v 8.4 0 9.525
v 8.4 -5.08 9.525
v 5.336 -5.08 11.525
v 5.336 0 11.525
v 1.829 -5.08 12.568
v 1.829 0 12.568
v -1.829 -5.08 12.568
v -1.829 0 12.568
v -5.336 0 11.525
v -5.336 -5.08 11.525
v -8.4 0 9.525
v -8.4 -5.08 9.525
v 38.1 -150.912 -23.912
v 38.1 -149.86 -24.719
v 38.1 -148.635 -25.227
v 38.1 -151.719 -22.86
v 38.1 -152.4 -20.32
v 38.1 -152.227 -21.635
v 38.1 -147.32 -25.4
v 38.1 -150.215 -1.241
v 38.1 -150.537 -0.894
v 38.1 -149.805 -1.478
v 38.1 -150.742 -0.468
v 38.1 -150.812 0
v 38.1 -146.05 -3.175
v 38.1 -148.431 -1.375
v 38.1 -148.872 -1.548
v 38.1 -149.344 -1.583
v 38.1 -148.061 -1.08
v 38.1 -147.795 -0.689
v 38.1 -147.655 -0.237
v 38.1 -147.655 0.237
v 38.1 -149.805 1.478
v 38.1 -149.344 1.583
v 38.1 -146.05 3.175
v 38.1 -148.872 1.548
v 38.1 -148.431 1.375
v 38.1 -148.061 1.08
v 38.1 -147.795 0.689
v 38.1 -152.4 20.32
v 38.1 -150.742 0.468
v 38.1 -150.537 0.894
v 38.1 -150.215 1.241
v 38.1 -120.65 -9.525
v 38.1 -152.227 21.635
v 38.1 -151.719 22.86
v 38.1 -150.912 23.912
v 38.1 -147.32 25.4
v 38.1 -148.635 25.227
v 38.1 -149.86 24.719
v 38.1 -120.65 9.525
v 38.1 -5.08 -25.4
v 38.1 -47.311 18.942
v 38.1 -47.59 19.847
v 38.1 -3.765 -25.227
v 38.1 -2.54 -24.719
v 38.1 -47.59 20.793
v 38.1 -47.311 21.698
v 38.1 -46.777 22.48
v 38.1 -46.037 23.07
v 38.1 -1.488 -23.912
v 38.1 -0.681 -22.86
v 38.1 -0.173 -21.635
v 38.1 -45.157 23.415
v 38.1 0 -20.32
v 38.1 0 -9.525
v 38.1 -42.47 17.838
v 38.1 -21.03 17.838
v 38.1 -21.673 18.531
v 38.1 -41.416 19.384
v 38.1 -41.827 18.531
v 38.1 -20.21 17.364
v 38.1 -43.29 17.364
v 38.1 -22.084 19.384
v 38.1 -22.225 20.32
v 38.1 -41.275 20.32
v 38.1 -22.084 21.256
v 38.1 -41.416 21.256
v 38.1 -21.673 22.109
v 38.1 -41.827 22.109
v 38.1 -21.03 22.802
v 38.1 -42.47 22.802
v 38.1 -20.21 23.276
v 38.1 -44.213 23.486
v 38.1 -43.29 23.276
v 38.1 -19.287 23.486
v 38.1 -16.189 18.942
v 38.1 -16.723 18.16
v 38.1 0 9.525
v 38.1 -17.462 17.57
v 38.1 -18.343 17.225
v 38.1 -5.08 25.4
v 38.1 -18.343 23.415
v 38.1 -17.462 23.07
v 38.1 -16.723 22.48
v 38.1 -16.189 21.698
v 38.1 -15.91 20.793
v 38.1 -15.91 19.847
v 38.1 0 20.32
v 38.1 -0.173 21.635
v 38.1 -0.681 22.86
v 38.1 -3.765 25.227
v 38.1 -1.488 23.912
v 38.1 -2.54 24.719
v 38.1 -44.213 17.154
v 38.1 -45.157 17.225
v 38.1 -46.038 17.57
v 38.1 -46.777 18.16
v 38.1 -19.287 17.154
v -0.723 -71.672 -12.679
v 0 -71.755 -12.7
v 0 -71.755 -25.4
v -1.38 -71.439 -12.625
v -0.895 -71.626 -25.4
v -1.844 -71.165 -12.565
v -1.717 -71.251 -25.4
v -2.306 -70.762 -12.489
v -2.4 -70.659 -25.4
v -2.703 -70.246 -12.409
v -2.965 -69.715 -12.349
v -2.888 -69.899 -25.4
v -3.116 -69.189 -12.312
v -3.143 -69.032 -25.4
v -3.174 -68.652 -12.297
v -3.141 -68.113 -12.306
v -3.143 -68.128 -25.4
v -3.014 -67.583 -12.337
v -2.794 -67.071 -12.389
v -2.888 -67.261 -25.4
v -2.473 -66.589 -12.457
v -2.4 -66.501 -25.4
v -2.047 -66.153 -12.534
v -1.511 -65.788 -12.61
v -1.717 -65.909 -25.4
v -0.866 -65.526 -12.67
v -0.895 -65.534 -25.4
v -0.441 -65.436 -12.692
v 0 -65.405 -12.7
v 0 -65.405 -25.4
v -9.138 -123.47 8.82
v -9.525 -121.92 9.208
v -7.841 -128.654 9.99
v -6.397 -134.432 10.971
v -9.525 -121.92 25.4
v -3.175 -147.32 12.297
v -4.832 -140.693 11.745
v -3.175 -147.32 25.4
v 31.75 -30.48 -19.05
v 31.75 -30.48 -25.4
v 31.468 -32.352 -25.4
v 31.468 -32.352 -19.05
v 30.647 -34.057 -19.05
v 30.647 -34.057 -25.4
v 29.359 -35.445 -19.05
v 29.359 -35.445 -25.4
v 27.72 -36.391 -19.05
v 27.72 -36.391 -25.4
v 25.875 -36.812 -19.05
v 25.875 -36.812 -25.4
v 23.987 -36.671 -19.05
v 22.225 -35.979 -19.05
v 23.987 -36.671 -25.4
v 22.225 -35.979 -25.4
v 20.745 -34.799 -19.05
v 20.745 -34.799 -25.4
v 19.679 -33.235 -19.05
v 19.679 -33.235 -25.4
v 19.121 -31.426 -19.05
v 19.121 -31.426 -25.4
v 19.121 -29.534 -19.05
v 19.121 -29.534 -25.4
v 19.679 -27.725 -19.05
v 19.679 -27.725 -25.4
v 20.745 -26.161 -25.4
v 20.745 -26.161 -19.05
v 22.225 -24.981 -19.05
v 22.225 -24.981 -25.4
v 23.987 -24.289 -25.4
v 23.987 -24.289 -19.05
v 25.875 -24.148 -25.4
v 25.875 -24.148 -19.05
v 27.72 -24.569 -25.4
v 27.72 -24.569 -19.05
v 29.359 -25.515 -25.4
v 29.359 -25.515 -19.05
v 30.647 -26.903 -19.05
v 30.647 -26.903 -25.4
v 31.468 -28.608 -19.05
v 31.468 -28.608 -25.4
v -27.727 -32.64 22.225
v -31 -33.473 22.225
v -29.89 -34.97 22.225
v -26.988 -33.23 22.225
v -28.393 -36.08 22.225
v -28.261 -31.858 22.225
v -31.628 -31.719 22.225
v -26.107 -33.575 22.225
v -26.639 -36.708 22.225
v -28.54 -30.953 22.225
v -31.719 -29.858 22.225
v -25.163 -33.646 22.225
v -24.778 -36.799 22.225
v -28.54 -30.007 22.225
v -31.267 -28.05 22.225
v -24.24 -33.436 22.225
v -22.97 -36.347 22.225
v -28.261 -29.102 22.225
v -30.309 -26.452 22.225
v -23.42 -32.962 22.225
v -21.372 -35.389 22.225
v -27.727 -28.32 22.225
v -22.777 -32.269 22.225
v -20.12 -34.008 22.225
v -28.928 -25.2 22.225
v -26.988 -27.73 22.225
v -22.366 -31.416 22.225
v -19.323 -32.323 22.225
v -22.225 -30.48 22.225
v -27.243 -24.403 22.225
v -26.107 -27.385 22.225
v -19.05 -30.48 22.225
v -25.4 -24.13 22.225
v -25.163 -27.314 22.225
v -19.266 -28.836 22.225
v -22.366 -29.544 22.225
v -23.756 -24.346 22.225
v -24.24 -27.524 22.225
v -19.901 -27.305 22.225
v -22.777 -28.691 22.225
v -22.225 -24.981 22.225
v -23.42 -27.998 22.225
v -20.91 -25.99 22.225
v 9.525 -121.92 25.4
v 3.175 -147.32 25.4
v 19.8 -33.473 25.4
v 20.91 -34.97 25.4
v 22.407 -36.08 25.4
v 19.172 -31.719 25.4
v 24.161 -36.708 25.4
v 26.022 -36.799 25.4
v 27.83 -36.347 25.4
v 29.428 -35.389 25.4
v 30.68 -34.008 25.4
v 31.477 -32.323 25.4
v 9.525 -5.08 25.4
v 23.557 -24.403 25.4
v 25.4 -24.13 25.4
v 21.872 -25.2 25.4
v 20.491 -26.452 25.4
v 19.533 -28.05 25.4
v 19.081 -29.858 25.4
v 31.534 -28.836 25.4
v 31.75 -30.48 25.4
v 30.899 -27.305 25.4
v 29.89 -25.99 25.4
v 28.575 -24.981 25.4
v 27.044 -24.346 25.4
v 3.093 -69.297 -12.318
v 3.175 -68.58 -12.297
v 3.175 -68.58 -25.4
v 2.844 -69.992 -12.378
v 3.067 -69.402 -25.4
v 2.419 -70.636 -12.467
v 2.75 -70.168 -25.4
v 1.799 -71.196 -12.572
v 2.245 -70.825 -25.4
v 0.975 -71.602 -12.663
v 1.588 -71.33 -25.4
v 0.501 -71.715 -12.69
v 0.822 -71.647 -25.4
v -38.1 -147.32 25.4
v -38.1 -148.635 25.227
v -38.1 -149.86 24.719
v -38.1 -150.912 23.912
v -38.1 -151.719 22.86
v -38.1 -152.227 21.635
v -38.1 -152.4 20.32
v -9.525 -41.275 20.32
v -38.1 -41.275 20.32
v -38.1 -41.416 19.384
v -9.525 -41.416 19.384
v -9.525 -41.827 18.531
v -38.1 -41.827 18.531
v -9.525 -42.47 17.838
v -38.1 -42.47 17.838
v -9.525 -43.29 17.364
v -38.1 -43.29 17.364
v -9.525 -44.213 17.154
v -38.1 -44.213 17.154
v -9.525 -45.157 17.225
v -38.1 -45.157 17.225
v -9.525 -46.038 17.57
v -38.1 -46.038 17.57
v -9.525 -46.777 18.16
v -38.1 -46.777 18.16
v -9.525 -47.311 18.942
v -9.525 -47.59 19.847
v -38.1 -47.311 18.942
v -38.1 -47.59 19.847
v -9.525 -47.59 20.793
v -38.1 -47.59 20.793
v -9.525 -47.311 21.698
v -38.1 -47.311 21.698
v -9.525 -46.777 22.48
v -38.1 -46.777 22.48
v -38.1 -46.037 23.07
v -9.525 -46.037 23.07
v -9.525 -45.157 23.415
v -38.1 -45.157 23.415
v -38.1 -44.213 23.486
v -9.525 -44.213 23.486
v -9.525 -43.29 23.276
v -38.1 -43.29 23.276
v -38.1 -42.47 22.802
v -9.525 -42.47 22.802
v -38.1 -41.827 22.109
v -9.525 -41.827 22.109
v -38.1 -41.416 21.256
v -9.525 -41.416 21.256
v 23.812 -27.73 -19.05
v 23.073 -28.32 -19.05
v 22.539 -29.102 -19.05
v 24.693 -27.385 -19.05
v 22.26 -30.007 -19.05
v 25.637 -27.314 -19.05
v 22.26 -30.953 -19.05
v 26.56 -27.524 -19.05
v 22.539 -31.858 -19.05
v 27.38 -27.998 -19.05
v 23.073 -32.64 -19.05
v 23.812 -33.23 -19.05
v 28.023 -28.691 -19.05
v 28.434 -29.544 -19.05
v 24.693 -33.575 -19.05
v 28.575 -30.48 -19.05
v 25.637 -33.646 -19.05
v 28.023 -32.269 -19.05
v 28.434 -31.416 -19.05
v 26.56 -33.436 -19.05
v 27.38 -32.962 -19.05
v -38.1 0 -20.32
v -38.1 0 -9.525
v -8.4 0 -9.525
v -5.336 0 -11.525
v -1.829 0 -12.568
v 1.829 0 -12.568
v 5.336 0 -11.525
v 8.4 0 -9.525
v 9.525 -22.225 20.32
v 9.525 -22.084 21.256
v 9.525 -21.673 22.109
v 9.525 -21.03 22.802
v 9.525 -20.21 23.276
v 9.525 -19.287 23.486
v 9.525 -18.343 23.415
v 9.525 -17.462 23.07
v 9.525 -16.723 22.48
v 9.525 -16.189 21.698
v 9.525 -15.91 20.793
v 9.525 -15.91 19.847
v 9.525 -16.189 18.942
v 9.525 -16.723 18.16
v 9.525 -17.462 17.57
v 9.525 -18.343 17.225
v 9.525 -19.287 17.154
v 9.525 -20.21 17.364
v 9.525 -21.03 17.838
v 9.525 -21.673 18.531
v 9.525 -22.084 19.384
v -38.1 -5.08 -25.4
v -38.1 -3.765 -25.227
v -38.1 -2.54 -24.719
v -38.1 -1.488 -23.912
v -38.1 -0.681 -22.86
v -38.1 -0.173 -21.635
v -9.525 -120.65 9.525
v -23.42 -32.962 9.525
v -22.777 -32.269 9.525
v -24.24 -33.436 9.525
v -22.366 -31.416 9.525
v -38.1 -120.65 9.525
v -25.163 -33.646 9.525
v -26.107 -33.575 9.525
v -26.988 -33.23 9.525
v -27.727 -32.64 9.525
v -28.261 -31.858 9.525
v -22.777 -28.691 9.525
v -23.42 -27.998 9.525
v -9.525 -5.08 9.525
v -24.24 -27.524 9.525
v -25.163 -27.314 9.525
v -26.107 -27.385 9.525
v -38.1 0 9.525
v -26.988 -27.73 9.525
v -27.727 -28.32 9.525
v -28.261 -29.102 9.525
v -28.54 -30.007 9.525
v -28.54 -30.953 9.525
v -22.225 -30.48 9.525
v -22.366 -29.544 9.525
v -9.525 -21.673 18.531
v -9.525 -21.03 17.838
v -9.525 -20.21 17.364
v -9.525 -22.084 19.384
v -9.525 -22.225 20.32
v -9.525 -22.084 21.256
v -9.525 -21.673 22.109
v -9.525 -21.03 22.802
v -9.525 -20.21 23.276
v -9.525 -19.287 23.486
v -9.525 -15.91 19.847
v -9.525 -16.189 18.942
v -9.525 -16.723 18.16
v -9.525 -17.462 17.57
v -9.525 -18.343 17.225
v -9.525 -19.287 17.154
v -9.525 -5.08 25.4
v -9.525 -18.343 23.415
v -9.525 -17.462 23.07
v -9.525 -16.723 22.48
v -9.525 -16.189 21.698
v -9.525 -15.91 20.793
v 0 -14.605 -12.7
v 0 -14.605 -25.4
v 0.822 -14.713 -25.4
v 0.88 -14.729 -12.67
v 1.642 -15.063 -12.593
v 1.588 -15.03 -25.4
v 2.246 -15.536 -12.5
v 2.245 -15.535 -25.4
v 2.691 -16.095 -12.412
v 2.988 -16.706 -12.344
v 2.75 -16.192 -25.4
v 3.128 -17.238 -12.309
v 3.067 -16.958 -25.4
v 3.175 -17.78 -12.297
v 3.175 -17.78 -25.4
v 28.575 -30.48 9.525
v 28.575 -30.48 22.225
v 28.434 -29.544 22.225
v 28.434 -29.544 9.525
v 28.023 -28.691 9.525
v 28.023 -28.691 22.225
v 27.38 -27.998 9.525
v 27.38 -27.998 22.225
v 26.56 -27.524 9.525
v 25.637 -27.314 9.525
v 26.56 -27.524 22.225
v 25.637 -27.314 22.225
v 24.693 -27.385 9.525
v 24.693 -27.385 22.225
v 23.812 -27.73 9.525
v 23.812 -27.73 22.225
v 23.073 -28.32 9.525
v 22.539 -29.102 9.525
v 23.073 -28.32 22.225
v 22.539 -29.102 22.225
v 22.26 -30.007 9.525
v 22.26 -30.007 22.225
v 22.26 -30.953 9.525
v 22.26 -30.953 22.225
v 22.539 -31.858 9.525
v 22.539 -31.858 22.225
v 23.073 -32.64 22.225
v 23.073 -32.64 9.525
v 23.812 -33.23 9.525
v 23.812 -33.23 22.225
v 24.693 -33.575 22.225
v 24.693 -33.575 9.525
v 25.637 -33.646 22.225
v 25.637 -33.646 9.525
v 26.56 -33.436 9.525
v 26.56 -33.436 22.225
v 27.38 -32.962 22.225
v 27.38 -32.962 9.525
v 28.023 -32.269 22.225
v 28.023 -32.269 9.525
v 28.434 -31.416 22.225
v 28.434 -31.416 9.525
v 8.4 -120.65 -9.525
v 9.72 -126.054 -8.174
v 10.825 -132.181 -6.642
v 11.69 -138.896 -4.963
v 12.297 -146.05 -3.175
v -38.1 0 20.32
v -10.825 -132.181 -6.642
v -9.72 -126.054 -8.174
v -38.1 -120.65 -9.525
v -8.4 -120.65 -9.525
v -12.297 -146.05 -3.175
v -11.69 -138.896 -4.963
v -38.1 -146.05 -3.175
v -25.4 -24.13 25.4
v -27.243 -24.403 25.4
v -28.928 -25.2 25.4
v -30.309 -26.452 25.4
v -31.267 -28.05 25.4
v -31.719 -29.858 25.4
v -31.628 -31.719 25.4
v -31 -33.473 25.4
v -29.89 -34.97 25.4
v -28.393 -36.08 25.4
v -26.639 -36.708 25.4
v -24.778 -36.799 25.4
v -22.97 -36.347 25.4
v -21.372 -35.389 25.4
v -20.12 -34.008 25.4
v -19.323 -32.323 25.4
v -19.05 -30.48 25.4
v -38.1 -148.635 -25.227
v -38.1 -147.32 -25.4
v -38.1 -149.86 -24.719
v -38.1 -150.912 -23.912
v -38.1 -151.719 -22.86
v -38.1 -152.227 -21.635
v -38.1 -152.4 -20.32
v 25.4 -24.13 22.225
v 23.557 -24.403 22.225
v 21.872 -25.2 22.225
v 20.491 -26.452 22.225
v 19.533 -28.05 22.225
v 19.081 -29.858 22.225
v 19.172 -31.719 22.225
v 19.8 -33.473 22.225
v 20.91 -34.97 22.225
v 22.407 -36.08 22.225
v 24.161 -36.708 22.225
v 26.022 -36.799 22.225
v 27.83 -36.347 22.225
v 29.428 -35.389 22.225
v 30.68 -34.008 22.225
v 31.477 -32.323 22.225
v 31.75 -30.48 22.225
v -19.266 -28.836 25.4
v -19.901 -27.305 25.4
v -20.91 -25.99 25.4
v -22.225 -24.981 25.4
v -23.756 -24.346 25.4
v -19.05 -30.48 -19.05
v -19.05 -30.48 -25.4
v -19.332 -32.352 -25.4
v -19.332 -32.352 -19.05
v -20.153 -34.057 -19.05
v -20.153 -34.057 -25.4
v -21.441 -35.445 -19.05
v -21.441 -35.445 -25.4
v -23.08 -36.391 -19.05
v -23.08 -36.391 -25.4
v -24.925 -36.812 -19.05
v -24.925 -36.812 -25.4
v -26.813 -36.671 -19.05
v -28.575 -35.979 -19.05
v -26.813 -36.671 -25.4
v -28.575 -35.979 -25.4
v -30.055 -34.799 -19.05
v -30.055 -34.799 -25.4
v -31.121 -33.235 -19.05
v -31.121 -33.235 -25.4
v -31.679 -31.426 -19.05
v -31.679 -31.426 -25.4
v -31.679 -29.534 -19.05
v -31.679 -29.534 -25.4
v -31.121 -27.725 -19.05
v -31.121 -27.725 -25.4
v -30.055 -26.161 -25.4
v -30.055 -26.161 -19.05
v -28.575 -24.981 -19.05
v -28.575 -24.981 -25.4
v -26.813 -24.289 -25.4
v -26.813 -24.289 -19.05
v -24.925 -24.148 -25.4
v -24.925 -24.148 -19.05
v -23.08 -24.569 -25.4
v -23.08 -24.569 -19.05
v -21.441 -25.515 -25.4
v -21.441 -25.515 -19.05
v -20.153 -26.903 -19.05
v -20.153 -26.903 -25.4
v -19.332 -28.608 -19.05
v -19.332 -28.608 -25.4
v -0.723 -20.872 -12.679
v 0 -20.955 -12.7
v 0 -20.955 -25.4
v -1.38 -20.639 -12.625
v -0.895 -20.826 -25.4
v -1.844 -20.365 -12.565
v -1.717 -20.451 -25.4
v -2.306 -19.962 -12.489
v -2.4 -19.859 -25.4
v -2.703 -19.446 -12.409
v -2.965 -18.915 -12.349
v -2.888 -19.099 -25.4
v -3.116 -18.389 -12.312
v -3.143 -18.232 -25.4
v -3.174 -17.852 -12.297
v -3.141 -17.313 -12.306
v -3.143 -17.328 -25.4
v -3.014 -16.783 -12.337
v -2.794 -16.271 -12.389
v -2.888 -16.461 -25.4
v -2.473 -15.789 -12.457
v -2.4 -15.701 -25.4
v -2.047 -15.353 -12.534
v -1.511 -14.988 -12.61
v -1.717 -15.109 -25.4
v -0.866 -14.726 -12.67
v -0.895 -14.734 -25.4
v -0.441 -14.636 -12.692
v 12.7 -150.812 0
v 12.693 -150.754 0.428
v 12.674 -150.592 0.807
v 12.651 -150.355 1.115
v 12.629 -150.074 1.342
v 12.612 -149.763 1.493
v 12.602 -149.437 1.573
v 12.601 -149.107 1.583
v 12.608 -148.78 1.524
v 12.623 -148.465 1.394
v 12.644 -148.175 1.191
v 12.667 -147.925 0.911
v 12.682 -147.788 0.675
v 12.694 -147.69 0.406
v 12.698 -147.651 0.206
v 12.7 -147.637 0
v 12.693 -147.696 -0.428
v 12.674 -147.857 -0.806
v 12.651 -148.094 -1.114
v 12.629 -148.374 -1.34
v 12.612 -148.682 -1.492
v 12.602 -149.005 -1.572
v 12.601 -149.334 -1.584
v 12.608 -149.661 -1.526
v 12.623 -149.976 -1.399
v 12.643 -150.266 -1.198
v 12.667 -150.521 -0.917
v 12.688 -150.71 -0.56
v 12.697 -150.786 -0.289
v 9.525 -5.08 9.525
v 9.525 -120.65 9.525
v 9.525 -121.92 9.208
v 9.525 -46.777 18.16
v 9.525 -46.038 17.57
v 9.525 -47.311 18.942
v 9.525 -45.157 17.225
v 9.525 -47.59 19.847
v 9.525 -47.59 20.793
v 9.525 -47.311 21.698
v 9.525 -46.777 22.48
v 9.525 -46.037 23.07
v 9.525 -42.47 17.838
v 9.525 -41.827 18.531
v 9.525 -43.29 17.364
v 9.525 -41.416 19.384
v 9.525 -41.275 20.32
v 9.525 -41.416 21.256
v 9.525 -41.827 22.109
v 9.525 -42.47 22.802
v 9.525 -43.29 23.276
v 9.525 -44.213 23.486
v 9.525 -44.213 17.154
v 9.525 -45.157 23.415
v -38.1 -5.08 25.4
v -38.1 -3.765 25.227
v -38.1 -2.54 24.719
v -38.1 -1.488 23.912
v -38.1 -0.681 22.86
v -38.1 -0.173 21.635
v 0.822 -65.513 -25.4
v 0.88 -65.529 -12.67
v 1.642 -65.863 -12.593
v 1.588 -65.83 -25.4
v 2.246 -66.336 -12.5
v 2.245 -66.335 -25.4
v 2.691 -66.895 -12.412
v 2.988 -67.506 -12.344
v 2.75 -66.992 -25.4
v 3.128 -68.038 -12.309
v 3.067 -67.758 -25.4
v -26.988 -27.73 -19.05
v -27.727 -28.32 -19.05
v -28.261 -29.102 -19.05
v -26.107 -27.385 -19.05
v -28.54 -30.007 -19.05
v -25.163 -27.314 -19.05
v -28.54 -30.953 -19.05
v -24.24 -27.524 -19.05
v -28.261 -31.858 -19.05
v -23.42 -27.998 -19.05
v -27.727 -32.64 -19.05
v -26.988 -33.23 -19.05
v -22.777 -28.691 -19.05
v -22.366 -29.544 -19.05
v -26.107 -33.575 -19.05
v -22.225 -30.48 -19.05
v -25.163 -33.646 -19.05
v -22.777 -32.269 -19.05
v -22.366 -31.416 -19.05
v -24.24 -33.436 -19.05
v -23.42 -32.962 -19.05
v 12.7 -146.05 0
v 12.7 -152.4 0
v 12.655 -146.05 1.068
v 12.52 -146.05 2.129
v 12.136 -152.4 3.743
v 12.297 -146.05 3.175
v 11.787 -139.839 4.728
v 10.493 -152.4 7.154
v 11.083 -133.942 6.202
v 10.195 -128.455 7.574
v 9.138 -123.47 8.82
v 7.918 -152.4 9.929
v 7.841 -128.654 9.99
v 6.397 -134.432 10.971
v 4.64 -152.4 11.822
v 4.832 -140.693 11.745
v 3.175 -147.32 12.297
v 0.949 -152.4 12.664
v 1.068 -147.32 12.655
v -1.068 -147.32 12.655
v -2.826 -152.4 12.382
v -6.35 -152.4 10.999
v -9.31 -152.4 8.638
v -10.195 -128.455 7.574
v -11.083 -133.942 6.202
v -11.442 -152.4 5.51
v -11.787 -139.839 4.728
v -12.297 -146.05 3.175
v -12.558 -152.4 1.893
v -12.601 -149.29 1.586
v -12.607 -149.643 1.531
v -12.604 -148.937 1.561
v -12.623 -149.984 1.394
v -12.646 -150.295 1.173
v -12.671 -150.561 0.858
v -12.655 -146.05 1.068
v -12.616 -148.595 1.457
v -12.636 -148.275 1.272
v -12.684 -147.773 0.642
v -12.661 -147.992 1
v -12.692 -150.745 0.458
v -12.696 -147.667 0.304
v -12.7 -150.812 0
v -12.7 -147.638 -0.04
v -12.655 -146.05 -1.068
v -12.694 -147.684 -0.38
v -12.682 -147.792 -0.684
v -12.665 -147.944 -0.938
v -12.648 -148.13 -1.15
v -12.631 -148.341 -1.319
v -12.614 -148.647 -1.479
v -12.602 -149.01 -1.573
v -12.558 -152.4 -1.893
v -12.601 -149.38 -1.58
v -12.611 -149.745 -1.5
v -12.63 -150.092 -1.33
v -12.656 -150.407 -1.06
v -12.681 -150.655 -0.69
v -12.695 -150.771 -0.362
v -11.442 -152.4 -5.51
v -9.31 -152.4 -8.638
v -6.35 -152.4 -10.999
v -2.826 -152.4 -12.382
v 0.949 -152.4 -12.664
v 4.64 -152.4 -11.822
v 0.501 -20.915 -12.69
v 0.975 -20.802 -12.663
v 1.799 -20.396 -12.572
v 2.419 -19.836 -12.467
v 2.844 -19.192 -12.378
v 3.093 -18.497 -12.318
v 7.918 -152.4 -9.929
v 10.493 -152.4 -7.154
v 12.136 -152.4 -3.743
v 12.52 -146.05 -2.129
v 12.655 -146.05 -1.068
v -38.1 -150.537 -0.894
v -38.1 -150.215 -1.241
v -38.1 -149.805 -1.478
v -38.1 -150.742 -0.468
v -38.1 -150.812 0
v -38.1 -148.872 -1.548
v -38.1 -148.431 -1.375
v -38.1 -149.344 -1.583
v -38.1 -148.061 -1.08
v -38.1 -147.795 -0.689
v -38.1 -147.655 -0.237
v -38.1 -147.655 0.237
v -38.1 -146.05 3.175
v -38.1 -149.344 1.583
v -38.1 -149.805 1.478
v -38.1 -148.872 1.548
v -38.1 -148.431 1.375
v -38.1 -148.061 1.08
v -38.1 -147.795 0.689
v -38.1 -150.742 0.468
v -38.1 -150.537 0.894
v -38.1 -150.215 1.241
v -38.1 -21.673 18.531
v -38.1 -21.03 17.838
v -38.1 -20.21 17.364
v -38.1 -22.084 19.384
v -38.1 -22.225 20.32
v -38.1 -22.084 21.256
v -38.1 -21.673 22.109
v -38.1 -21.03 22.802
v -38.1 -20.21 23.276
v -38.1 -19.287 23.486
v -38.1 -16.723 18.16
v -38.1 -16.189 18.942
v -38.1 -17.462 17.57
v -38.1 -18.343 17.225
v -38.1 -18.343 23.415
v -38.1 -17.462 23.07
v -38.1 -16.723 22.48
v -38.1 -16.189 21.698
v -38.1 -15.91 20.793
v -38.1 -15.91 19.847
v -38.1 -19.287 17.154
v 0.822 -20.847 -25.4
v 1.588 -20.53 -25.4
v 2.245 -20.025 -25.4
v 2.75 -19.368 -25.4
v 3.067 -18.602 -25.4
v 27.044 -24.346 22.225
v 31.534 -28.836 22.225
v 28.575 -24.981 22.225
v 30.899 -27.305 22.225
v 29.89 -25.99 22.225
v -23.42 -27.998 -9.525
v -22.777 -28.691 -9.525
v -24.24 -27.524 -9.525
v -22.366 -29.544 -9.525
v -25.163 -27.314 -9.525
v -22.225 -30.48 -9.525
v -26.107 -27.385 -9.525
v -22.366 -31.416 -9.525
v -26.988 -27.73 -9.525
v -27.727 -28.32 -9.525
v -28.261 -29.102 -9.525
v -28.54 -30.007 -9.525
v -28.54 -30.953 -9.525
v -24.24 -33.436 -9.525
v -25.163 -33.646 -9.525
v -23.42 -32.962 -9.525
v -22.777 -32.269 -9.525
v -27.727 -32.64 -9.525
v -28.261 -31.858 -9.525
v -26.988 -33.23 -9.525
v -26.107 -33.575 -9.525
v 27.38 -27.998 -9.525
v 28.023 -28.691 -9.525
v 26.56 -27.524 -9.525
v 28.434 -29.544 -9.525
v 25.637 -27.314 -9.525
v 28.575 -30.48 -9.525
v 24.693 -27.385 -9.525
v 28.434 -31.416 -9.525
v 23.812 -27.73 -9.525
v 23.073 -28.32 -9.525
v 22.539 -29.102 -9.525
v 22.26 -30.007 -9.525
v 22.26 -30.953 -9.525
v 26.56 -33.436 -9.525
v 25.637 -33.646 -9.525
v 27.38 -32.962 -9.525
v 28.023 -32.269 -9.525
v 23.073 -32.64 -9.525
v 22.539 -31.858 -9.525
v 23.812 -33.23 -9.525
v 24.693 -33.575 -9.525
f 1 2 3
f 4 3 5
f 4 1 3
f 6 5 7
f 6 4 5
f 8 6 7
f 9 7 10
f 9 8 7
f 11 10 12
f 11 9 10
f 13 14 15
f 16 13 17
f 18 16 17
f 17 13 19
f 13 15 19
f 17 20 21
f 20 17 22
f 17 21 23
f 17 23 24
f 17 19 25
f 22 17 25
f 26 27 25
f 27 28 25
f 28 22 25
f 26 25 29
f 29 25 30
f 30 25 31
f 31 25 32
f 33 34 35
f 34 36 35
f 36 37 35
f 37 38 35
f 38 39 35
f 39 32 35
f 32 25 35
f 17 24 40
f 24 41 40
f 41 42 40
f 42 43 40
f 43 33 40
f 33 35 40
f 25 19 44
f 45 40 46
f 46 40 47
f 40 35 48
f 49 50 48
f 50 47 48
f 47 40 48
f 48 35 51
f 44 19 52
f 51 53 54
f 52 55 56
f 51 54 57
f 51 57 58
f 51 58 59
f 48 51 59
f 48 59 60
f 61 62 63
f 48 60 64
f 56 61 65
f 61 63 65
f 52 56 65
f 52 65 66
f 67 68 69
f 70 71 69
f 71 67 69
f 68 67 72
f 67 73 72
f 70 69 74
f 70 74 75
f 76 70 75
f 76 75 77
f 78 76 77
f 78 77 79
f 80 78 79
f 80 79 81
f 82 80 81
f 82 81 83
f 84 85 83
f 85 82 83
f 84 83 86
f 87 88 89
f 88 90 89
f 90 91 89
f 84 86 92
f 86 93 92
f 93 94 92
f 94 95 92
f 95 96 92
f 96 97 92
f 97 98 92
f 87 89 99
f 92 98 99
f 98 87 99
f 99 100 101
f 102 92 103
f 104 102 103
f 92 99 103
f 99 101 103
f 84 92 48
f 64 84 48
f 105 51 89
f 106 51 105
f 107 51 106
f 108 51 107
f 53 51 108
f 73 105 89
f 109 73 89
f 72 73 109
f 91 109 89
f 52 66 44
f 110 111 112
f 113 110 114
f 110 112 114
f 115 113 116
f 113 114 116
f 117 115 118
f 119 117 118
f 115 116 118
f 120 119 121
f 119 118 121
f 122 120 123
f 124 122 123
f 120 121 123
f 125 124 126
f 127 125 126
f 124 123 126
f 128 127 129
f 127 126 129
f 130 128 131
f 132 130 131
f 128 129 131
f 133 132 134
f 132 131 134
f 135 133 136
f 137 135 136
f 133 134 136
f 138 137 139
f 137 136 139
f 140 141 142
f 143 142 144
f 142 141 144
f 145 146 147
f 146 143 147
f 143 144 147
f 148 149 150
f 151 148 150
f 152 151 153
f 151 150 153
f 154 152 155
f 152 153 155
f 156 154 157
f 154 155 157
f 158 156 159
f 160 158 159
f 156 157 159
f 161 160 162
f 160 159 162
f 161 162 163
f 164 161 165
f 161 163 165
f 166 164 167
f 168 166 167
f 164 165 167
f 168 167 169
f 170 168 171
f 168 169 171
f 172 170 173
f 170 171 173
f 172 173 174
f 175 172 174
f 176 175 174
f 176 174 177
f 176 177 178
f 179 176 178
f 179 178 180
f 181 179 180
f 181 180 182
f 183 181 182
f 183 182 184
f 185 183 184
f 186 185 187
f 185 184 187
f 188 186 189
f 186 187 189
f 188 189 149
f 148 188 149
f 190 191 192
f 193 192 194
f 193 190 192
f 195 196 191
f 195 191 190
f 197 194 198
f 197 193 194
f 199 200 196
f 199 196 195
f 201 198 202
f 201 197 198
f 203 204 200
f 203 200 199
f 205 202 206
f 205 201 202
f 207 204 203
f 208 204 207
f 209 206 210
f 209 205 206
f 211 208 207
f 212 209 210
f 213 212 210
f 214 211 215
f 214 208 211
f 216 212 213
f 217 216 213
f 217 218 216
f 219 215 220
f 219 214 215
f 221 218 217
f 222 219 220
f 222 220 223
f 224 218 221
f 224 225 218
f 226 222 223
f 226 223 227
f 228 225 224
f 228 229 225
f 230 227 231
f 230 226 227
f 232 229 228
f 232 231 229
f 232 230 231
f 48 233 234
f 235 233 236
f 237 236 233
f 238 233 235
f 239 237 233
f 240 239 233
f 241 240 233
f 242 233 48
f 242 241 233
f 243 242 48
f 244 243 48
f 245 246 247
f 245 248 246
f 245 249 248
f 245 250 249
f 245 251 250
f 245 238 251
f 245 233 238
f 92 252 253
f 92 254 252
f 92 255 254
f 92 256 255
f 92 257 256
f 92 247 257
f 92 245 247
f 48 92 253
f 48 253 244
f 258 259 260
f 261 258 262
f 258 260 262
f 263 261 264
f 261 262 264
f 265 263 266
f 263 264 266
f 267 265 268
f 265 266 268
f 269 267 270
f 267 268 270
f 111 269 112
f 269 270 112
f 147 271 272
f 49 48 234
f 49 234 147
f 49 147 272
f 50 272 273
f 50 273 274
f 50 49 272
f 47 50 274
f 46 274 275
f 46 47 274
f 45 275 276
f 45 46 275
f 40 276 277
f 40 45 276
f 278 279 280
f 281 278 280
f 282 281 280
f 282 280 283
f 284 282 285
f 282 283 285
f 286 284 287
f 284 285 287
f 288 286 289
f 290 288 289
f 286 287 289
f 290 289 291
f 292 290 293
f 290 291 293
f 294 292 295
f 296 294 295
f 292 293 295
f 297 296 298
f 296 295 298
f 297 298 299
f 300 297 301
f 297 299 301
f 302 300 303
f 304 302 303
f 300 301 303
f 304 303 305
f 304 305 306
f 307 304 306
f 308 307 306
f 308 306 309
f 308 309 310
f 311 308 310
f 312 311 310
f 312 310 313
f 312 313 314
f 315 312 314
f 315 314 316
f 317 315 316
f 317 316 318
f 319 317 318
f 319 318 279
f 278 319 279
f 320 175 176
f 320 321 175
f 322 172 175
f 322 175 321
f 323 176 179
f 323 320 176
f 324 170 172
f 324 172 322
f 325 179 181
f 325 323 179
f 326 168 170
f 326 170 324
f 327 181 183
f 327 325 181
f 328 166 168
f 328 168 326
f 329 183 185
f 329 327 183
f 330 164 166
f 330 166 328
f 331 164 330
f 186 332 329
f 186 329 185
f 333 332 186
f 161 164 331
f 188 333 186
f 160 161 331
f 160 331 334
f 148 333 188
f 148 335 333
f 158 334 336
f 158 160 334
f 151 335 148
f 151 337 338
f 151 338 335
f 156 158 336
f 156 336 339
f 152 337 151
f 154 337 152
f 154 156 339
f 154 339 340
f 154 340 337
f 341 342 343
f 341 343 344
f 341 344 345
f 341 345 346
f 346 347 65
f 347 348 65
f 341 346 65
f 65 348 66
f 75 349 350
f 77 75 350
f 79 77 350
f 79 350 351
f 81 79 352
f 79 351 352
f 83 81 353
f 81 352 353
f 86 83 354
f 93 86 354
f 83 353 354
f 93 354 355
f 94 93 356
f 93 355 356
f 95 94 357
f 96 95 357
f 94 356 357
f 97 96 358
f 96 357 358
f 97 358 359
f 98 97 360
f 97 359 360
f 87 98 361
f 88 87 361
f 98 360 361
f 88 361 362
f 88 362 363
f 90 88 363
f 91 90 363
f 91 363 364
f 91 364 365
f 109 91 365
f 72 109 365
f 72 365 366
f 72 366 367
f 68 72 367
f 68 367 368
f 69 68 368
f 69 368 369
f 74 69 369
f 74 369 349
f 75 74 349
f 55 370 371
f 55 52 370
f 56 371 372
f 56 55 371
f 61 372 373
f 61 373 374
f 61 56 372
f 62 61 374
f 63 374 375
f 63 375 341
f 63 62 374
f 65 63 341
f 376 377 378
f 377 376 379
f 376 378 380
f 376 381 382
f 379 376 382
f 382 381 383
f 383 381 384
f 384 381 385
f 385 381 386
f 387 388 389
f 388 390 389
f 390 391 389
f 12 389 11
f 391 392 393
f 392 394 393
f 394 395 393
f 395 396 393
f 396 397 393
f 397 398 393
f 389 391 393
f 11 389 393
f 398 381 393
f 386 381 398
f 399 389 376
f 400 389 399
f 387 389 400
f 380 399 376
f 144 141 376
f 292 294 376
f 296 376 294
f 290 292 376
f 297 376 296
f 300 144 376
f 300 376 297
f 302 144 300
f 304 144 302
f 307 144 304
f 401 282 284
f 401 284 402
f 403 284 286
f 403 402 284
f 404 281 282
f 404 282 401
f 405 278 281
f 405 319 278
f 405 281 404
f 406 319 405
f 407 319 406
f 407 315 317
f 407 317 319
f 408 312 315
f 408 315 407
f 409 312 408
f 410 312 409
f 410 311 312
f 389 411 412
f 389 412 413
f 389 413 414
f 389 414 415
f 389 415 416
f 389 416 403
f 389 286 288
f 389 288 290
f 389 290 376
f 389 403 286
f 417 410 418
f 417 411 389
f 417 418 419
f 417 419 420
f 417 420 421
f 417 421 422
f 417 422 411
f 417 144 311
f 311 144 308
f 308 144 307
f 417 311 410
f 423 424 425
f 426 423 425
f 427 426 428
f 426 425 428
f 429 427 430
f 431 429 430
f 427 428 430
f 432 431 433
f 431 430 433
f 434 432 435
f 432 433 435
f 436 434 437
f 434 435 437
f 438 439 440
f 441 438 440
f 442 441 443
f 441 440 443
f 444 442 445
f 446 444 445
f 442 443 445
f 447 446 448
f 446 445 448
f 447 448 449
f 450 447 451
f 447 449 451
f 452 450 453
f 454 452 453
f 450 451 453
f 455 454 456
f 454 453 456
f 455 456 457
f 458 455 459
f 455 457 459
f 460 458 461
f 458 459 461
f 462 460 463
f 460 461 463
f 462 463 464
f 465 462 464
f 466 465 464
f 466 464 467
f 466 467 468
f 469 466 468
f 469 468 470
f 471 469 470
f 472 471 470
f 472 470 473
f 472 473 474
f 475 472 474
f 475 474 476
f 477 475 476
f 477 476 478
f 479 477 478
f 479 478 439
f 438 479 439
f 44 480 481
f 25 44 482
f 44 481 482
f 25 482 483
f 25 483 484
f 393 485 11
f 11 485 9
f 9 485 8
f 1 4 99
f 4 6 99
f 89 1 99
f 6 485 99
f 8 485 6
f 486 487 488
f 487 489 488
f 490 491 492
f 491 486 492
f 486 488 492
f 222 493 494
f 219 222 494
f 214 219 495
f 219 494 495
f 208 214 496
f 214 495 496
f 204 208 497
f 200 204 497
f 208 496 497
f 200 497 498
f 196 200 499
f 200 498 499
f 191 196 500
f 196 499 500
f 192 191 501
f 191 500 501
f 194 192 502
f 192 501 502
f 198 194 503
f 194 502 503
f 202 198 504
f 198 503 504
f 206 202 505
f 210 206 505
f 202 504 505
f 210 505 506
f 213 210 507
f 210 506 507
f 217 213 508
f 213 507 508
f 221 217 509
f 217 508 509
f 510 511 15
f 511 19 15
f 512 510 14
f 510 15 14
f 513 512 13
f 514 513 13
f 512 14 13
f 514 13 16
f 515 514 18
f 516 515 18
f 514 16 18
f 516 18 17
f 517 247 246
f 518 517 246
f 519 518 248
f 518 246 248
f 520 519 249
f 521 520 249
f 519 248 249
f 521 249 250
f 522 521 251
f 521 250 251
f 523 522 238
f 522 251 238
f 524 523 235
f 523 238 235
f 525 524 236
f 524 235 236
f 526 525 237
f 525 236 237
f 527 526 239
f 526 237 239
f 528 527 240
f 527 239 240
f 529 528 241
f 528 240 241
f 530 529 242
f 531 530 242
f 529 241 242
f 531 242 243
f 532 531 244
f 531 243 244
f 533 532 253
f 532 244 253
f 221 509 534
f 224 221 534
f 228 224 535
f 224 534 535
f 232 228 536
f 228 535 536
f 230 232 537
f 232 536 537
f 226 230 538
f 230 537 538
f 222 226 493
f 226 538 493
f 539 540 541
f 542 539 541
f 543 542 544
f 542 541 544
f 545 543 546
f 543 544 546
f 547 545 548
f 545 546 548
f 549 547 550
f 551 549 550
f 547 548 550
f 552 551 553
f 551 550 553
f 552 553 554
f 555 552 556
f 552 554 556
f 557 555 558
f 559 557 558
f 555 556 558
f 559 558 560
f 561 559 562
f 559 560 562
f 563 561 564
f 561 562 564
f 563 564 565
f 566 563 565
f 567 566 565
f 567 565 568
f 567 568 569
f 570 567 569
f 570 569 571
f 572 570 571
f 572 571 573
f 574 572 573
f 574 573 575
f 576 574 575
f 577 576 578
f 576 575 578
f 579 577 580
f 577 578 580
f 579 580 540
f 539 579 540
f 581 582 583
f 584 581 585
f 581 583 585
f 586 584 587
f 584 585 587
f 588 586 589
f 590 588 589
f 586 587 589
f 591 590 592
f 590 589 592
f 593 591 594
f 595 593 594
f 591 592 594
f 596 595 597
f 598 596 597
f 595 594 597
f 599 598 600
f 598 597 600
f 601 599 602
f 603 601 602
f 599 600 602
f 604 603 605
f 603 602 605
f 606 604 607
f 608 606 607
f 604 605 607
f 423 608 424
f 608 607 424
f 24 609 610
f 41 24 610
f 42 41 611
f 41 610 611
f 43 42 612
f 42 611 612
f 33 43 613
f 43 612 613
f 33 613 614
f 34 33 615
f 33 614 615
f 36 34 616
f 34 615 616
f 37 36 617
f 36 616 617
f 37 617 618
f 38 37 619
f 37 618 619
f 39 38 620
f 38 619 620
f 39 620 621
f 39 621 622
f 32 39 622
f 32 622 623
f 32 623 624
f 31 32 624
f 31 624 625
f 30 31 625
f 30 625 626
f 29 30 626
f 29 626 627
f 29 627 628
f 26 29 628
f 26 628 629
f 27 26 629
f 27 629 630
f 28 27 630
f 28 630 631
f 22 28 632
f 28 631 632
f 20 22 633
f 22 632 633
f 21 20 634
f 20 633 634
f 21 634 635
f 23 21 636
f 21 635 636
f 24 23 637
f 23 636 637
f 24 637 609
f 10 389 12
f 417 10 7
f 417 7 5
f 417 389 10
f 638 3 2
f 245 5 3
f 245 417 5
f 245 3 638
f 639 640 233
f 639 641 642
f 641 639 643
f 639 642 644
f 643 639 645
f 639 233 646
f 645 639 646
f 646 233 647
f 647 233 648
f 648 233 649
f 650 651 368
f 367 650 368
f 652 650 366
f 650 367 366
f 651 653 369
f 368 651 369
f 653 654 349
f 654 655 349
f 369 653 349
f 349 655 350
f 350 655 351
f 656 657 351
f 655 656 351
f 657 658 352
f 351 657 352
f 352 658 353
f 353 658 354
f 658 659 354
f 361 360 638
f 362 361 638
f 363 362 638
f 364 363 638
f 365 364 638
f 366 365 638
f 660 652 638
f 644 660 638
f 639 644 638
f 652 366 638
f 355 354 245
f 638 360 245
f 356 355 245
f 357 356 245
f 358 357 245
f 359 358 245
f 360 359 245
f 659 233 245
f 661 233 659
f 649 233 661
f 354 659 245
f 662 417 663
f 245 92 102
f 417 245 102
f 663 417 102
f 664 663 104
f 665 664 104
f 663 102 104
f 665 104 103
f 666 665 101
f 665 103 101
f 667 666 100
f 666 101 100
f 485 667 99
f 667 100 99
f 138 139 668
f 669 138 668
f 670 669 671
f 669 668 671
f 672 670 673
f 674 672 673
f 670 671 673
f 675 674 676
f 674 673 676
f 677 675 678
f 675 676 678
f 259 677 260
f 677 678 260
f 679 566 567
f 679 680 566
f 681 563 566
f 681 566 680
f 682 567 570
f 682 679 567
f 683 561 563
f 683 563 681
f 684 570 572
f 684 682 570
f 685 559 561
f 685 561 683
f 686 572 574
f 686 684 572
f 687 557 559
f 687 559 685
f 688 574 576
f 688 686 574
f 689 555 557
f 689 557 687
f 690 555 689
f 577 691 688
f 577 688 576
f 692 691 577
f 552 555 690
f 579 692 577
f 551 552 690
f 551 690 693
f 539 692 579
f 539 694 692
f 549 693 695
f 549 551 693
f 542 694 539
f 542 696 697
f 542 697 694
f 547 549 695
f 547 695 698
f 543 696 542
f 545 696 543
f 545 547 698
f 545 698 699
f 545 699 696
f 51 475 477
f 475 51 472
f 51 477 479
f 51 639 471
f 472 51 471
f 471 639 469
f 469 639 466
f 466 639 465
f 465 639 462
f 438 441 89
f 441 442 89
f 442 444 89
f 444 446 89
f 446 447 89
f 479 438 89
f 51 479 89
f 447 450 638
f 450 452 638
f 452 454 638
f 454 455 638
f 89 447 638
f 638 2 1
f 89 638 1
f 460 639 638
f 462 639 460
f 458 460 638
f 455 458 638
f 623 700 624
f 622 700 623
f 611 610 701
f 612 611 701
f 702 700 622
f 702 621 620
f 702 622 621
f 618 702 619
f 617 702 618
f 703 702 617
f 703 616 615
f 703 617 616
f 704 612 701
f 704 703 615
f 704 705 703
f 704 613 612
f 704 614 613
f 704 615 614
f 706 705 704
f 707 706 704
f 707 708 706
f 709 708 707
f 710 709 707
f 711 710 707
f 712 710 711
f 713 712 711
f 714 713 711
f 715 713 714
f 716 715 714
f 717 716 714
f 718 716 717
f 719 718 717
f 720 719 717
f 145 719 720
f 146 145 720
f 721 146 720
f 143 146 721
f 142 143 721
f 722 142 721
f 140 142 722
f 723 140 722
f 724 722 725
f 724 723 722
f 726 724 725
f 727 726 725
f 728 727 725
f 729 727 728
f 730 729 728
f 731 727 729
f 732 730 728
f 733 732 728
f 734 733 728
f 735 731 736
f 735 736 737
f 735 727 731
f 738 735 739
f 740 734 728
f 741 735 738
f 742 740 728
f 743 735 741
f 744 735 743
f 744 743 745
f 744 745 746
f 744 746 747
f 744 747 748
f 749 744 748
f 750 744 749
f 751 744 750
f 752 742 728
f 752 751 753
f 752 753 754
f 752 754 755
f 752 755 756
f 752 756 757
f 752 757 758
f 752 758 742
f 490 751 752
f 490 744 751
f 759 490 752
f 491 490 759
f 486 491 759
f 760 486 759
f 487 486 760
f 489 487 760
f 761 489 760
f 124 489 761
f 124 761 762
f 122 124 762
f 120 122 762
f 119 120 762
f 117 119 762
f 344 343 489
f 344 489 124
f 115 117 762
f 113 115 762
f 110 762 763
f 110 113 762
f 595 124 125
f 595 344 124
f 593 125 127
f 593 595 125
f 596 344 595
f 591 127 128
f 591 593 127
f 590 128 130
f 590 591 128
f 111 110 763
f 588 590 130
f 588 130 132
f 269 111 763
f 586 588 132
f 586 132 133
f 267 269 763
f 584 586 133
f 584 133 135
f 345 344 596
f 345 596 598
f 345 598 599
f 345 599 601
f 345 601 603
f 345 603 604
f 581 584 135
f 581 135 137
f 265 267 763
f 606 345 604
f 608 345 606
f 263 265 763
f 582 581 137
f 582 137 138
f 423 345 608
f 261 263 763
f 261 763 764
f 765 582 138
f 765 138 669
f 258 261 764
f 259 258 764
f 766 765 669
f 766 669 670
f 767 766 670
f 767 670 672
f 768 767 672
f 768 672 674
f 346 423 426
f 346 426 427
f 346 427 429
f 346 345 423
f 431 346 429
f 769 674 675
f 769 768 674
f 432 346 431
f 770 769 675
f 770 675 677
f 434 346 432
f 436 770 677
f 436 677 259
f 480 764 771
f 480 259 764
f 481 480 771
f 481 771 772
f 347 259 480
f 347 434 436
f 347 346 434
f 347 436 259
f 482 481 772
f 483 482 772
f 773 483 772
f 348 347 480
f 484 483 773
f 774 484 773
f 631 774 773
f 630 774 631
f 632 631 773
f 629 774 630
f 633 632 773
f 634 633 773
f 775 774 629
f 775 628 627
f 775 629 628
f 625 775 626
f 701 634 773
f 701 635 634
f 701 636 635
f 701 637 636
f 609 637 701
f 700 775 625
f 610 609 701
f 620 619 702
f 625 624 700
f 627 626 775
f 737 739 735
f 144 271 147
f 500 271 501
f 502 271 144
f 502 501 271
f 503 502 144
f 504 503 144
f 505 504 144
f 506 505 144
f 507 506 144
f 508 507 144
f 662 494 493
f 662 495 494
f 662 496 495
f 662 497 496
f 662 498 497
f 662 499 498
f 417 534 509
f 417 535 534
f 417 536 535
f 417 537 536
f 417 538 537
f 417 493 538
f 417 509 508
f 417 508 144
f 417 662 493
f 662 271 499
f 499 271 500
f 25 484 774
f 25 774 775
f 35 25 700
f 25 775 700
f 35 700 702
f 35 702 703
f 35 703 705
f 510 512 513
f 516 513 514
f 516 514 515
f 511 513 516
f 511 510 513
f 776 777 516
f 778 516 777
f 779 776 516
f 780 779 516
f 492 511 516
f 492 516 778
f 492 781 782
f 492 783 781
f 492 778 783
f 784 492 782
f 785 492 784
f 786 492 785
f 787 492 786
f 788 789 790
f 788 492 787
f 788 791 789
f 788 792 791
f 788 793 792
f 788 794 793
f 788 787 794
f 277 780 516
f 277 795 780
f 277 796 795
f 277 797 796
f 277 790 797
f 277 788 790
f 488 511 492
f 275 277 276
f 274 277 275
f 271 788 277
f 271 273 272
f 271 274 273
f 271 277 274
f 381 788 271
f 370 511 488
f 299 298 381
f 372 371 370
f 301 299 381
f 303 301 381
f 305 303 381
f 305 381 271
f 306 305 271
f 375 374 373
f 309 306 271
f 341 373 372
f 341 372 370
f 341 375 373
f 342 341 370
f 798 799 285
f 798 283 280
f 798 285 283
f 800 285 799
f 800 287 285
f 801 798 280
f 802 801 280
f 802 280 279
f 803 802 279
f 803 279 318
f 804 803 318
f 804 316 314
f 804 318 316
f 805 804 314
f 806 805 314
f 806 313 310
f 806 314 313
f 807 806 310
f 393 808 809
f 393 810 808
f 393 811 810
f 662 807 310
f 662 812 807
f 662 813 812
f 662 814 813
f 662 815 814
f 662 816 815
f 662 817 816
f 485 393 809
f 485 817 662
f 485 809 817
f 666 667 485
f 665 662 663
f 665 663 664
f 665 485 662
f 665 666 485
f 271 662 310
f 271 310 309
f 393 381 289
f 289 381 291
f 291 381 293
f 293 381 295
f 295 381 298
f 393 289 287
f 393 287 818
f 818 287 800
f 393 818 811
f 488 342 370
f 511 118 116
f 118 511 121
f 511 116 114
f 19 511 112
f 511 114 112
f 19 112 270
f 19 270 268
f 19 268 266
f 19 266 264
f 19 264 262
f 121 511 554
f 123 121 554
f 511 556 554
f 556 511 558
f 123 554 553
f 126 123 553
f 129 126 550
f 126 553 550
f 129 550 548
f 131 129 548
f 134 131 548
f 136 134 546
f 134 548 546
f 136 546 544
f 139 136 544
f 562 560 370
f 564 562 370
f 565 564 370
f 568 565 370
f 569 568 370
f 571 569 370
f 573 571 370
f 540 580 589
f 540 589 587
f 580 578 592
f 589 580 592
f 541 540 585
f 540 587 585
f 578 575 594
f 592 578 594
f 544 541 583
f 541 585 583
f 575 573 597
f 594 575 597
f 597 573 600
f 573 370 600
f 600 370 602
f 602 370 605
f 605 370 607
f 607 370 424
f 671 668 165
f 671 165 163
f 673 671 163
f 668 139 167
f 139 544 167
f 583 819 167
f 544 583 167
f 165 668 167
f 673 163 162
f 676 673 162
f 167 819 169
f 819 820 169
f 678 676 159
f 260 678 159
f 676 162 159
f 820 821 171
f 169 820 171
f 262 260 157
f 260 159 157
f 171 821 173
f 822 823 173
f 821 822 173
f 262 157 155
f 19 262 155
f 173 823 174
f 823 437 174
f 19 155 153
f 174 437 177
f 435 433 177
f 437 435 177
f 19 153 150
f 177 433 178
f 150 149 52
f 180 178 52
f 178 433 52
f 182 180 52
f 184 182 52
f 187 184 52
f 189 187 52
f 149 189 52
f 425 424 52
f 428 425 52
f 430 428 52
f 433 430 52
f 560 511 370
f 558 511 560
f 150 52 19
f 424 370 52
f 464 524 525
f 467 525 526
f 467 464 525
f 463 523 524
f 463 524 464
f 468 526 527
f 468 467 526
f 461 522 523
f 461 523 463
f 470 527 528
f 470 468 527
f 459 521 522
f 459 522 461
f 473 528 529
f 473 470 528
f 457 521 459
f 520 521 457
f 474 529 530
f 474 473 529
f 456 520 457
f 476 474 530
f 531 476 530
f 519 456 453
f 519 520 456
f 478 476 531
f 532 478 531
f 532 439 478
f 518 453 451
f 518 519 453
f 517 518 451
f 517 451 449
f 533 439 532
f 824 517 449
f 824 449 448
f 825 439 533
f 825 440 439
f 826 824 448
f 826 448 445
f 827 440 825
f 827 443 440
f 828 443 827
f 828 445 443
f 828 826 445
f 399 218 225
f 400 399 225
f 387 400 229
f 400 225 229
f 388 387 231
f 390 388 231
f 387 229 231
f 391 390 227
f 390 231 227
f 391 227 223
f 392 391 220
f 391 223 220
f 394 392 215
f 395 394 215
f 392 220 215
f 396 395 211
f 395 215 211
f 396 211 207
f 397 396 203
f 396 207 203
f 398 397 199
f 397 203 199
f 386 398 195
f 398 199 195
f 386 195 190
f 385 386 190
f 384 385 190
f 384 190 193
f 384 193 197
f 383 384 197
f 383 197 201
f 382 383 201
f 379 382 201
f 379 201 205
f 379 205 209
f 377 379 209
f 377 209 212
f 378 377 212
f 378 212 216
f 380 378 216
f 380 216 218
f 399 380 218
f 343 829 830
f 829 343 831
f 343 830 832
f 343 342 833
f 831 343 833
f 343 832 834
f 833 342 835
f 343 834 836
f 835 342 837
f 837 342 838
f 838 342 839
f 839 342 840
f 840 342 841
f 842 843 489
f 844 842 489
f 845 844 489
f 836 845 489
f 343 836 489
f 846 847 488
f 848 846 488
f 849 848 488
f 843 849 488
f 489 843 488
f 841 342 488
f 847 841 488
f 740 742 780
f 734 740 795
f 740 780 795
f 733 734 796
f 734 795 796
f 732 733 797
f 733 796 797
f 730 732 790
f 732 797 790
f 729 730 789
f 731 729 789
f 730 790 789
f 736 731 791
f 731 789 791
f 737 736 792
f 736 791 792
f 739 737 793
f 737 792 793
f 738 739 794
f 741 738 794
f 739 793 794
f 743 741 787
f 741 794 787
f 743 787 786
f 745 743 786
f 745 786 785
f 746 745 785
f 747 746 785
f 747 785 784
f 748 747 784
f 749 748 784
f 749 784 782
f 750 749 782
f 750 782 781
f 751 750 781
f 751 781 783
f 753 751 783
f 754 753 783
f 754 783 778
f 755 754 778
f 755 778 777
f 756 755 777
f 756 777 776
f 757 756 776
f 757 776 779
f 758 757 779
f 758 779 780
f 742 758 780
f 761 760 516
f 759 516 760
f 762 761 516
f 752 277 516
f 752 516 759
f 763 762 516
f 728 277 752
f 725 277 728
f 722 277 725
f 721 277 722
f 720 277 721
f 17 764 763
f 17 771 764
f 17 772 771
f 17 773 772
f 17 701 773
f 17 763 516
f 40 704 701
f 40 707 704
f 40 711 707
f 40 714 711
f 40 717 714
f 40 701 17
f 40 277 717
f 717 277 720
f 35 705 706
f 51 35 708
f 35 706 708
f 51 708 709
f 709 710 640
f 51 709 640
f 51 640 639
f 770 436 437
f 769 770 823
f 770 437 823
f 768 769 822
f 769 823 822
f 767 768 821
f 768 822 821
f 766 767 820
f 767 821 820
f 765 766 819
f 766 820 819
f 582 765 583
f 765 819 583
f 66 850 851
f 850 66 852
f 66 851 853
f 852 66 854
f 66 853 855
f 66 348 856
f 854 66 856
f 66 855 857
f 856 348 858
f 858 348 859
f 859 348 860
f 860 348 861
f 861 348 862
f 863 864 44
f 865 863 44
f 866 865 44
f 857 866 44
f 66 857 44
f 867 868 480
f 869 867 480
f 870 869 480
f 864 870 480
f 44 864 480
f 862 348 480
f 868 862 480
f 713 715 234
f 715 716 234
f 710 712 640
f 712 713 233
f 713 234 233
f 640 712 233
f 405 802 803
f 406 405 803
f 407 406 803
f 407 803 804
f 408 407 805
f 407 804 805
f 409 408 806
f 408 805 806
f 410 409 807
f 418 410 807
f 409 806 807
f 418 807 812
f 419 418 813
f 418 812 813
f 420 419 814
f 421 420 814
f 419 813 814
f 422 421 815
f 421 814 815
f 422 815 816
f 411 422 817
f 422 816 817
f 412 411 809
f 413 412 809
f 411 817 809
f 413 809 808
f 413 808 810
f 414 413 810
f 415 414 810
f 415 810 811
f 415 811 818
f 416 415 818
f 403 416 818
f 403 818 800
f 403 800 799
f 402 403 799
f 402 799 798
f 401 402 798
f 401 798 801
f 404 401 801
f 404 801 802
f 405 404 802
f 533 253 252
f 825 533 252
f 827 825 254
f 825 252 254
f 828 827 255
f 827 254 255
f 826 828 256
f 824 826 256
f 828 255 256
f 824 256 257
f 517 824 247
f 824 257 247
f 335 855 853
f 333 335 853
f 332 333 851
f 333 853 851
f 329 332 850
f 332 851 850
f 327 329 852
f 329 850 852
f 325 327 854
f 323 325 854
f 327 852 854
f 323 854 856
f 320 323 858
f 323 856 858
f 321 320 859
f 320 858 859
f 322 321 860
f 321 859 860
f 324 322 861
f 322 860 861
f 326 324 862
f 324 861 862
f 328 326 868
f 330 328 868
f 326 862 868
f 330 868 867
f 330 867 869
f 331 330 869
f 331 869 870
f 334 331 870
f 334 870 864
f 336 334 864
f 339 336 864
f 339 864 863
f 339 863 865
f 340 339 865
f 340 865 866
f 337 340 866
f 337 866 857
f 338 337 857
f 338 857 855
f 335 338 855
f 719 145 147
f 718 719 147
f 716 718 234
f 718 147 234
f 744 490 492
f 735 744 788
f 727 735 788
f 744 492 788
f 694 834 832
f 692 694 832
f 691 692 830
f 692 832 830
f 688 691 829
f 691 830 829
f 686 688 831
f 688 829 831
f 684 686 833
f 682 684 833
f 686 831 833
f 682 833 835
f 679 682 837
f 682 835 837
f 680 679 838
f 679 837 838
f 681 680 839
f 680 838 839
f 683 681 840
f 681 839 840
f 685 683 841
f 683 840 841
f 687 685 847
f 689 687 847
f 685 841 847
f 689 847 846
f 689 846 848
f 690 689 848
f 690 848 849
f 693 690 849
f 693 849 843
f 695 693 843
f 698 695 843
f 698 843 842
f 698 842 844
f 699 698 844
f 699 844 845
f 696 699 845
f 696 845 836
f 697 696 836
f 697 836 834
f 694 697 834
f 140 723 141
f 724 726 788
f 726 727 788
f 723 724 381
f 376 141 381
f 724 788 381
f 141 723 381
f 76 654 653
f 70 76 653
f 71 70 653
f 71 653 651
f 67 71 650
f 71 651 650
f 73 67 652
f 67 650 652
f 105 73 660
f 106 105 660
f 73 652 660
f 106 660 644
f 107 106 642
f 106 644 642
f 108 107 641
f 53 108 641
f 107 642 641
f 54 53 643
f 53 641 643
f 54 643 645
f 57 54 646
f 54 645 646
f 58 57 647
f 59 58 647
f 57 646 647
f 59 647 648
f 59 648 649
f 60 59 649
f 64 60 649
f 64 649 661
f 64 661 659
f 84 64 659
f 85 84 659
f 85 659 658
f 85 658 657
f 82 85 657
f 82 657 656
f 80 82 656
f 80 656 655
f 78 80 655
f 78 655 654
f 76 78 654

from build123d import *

# Parameters (mm, degrees)
F0_W      = 76.2
F0_H      = 50.8
F0_R      = 12.7
F1_DEPTH  = 152.4
F2_R      = 5.08
F4_DEPTH  = 76.201
F5_W      = 19.05
F5_H      = 116.84
F6_DEPTH  = 19.05
F8_DEPTH  = 50.801
F10_DEPTH = 76.201
F12_DEPTH = 3.175
F13_R     = 3.175
F14_DEPTH = 47.6260001
F15_R     = 3.175
F16_DEPTH = 47.6260001
F17_R     = 6.35
F18_DEPTH = 6.35
F19_R     = 3.175
F20_DEPTH = 76.2010001


with BuildPart() as f1:
    # F0 (on Front) → F1 (new body)
    with BuildSketch(Plane.XZ):
        Rectangle(F0_W, F0_H)
        Circle(F0_R, mode=Mode.SUBTRACT)
    extrude(amount=F1_DEPTH)

    # F2
    f2_edges = [f1.edges().sort_by_distance(p)[0] for p in [
        (0, -152.4, 25.4),
        (0, -152.4, -25.4),
        (0, 0, 25.4),
        (0, 0, -25.4),
    ]]
    fillet(f2_edges, radius=F2_R)

    # F3 (on face) → F4 (cut, through all)
    with BuildSketch(Plane(origin=(-38.1, 0, 0), x_dir=(0, -1, 0), z_dir=(-1, 0, 0))):
        Polygon((12.7, 0), (0, 0), (0, -3.175), (0, -9.525), (120.65, -9.525), (120.65, 0), (88.9, 0), align=None)
        Polygon((0, 3.175), (0, 0), (12.7, 0), (88.9, 0), (120.65, 0), (120.65, 9.525), (0, 9.525), align=None)
        Polygon((120.65, 9.525), (120.65, 0), (139.7, 0), (146.05, 0), (146.05, 3.175), align=None)
        Polygon((139.7, 0), (120.65, 0), (120.65, -9.525), (146.05, -3.175), (146.05, 0), align=None)
    extrude(amount=-F4_DEPTH, mode=Mode.SUBTRACT)

    # F5 (on face) → F6 (cut)
    with BuildSketch(Plane.XY.offset(25.4)):
        Polygon((-3.175, -147.32), (0, -147.32), (3.175, -147.32), (9.525, -121.92), (-9.525, -121.92), align=None)
        with Locations((0, -63.5)):
            Rectangle(F5_W, F5_H)
    extrude(amount=-F6_DEPTH, mode=Mode.SUBTRACT)

    # F7 (on face) → F8 (cut, through all)
    with BuildSketch(Plane(origin=(0, 0, -25.4), x_dir=(1, 0, 0), z_dir=(0, 0, -1))):
        with BuildLine():
            ThreePointArc((0, 20.955), (-3.175, 17.78), (0, 14.605))
            Line((0, 14.605), (0, 17.78))
            Line((0, 17.78), (0, 20.955))
        make_face()
        with BuildLine():
            ThreePointArc((0, 71.755), (-3.175, 68.58), (0, 65.405))
            Line((0, 65.405), (0, 68.58))
            Line((0, 68.58), (0, 71.755))
        make_face()
        with BuildLine():
            Line((0, 68.58), (0, 65.405))
            ThreePointArc((0, 65.405), (2.2450640303, 66.3349359697), (3.175, 68.58))
            ThreePointArc((3.175, 68.58), (2.2450640303, 70.8250640303), (0, 71.755))
            Line((0, 71.755), (0, 68.58))
        make_face()
        with BuildLine():
            Line((0, 17.78), (0, 14.605))
            ThreePointArc((0, 14.605), (2.2450640303, 15.5349359697), (3.175, 17.78))
            ThreePointArc((3.175, 17.78), (2.2450640303, 20.0250640303), (0, 20.955))
            Line((0, 20.955), (0, 17.78))
        make_face()
    extrude(amount=-F8_DEPTH, mode=Mode.SUBTRACT)

    # F9 (on face) → F10 (cut, through all)
    with BuildSketch(Plane(origin=(-38.1, 0, 0), x_dir=(0, -1, 0), z_dir=(-1, 0, 0))):
        with BuildLine():
            ThreePointArc((147.6375, 0), (149.225, -1.5875), (150.8125, 0))
            Line((150.8125, 0), (149.225, 0))
            Line((149.225, 0), (147.6375, 0))
        make_face()
        with BuildLine():
            Line((149.225, 0), (150.8125, 0))
            ThreePointArc((150.8125, 0), (149.225, 1.5875), (147.6375, 0))
            Line((147.6375, 0), (149.225, 0))
        make_face()
    extrude(amount=-F10_DEPTH, mode=Mode.SUBTRACT)

    # F11 (on face) → F12 (cut)
    with BuildSketch(Plane.XY.offset(25.4)):
        with BuildLine():
            ThreePointArc((-19.05, -30.48), (-20.9098719395, -25.9898719395), (-25.4, -24.13))
            ThreePointArc((-25.4, -24.13), (-29.8901280605, -34.9701280605), (-19.05, -30.48))
        make_face()
        with BuildLine():
            ThreePointArc((31.75, -30.48), (29.8901280605, -25.9898719395), (25.4, -24.13))
            ThreePointArc((25.4, -24.13), (20.9098719395, -34.9701280605), (31.75, -30.48))
        make_face()
    extrude(amount=-F12_DEPTH, mode=Mode.SUBTRACT)

    # F13 (on face) → F14 (cut, through all)
    with BuildSketch(Plane.XY.offset(22.225)):
        with Locations((25.4, -30.48)):
            Circle(F13_R)
    extrude(amount=-F14_DEPTH, mode=Mode.SUBTRACT)

    # F15 (on face) → F16 (cut, through all)
    with BuildSketch(Plane.XY.offset(22.225)):
        with Locations((-25.4, -30.48)):
            Circle(F15_R)
    extrude(amount=-F16_DEPTH, mode=Mode.SUBTRACT)

    # F17 (on face) → F18 (cut)
    with BuildSketch(Plane(origin=(0, 0, -25.4), x_dir=(1, 0, 0), z_dir=(0, 0, -1))):
        with Locations((-25.4, 30.48)):
            Circle(F17_R)
        with Locations((25.4, 30.48)):
            Circle(F17_R)
    extrude(amount=-F18_DEPTH, mode=Mode.SUBTRACT)

    # F19 (on face) → F20 (cut, through all)
    with BuildSketch(Plane(origin=(-38.1, 0, 0), x_dir=(0, -1, 0), z_dir=(-1, 0, 0))):
        with BuildLine():
            ThreePointArc((47.625, 20.32), (44.45, 23.495), (41.275, 20.32))
            ThreePointArc((41.275, 20.32), (44.45, 17.145), (47.625, 20.32))
        make_face()
        with Locations((19.05, 20.32)):
            Circle(F19_R)
    extrude(amount=-F20_DEPTH, mode=Mode.SUBTRACT)


solid = f1.part
